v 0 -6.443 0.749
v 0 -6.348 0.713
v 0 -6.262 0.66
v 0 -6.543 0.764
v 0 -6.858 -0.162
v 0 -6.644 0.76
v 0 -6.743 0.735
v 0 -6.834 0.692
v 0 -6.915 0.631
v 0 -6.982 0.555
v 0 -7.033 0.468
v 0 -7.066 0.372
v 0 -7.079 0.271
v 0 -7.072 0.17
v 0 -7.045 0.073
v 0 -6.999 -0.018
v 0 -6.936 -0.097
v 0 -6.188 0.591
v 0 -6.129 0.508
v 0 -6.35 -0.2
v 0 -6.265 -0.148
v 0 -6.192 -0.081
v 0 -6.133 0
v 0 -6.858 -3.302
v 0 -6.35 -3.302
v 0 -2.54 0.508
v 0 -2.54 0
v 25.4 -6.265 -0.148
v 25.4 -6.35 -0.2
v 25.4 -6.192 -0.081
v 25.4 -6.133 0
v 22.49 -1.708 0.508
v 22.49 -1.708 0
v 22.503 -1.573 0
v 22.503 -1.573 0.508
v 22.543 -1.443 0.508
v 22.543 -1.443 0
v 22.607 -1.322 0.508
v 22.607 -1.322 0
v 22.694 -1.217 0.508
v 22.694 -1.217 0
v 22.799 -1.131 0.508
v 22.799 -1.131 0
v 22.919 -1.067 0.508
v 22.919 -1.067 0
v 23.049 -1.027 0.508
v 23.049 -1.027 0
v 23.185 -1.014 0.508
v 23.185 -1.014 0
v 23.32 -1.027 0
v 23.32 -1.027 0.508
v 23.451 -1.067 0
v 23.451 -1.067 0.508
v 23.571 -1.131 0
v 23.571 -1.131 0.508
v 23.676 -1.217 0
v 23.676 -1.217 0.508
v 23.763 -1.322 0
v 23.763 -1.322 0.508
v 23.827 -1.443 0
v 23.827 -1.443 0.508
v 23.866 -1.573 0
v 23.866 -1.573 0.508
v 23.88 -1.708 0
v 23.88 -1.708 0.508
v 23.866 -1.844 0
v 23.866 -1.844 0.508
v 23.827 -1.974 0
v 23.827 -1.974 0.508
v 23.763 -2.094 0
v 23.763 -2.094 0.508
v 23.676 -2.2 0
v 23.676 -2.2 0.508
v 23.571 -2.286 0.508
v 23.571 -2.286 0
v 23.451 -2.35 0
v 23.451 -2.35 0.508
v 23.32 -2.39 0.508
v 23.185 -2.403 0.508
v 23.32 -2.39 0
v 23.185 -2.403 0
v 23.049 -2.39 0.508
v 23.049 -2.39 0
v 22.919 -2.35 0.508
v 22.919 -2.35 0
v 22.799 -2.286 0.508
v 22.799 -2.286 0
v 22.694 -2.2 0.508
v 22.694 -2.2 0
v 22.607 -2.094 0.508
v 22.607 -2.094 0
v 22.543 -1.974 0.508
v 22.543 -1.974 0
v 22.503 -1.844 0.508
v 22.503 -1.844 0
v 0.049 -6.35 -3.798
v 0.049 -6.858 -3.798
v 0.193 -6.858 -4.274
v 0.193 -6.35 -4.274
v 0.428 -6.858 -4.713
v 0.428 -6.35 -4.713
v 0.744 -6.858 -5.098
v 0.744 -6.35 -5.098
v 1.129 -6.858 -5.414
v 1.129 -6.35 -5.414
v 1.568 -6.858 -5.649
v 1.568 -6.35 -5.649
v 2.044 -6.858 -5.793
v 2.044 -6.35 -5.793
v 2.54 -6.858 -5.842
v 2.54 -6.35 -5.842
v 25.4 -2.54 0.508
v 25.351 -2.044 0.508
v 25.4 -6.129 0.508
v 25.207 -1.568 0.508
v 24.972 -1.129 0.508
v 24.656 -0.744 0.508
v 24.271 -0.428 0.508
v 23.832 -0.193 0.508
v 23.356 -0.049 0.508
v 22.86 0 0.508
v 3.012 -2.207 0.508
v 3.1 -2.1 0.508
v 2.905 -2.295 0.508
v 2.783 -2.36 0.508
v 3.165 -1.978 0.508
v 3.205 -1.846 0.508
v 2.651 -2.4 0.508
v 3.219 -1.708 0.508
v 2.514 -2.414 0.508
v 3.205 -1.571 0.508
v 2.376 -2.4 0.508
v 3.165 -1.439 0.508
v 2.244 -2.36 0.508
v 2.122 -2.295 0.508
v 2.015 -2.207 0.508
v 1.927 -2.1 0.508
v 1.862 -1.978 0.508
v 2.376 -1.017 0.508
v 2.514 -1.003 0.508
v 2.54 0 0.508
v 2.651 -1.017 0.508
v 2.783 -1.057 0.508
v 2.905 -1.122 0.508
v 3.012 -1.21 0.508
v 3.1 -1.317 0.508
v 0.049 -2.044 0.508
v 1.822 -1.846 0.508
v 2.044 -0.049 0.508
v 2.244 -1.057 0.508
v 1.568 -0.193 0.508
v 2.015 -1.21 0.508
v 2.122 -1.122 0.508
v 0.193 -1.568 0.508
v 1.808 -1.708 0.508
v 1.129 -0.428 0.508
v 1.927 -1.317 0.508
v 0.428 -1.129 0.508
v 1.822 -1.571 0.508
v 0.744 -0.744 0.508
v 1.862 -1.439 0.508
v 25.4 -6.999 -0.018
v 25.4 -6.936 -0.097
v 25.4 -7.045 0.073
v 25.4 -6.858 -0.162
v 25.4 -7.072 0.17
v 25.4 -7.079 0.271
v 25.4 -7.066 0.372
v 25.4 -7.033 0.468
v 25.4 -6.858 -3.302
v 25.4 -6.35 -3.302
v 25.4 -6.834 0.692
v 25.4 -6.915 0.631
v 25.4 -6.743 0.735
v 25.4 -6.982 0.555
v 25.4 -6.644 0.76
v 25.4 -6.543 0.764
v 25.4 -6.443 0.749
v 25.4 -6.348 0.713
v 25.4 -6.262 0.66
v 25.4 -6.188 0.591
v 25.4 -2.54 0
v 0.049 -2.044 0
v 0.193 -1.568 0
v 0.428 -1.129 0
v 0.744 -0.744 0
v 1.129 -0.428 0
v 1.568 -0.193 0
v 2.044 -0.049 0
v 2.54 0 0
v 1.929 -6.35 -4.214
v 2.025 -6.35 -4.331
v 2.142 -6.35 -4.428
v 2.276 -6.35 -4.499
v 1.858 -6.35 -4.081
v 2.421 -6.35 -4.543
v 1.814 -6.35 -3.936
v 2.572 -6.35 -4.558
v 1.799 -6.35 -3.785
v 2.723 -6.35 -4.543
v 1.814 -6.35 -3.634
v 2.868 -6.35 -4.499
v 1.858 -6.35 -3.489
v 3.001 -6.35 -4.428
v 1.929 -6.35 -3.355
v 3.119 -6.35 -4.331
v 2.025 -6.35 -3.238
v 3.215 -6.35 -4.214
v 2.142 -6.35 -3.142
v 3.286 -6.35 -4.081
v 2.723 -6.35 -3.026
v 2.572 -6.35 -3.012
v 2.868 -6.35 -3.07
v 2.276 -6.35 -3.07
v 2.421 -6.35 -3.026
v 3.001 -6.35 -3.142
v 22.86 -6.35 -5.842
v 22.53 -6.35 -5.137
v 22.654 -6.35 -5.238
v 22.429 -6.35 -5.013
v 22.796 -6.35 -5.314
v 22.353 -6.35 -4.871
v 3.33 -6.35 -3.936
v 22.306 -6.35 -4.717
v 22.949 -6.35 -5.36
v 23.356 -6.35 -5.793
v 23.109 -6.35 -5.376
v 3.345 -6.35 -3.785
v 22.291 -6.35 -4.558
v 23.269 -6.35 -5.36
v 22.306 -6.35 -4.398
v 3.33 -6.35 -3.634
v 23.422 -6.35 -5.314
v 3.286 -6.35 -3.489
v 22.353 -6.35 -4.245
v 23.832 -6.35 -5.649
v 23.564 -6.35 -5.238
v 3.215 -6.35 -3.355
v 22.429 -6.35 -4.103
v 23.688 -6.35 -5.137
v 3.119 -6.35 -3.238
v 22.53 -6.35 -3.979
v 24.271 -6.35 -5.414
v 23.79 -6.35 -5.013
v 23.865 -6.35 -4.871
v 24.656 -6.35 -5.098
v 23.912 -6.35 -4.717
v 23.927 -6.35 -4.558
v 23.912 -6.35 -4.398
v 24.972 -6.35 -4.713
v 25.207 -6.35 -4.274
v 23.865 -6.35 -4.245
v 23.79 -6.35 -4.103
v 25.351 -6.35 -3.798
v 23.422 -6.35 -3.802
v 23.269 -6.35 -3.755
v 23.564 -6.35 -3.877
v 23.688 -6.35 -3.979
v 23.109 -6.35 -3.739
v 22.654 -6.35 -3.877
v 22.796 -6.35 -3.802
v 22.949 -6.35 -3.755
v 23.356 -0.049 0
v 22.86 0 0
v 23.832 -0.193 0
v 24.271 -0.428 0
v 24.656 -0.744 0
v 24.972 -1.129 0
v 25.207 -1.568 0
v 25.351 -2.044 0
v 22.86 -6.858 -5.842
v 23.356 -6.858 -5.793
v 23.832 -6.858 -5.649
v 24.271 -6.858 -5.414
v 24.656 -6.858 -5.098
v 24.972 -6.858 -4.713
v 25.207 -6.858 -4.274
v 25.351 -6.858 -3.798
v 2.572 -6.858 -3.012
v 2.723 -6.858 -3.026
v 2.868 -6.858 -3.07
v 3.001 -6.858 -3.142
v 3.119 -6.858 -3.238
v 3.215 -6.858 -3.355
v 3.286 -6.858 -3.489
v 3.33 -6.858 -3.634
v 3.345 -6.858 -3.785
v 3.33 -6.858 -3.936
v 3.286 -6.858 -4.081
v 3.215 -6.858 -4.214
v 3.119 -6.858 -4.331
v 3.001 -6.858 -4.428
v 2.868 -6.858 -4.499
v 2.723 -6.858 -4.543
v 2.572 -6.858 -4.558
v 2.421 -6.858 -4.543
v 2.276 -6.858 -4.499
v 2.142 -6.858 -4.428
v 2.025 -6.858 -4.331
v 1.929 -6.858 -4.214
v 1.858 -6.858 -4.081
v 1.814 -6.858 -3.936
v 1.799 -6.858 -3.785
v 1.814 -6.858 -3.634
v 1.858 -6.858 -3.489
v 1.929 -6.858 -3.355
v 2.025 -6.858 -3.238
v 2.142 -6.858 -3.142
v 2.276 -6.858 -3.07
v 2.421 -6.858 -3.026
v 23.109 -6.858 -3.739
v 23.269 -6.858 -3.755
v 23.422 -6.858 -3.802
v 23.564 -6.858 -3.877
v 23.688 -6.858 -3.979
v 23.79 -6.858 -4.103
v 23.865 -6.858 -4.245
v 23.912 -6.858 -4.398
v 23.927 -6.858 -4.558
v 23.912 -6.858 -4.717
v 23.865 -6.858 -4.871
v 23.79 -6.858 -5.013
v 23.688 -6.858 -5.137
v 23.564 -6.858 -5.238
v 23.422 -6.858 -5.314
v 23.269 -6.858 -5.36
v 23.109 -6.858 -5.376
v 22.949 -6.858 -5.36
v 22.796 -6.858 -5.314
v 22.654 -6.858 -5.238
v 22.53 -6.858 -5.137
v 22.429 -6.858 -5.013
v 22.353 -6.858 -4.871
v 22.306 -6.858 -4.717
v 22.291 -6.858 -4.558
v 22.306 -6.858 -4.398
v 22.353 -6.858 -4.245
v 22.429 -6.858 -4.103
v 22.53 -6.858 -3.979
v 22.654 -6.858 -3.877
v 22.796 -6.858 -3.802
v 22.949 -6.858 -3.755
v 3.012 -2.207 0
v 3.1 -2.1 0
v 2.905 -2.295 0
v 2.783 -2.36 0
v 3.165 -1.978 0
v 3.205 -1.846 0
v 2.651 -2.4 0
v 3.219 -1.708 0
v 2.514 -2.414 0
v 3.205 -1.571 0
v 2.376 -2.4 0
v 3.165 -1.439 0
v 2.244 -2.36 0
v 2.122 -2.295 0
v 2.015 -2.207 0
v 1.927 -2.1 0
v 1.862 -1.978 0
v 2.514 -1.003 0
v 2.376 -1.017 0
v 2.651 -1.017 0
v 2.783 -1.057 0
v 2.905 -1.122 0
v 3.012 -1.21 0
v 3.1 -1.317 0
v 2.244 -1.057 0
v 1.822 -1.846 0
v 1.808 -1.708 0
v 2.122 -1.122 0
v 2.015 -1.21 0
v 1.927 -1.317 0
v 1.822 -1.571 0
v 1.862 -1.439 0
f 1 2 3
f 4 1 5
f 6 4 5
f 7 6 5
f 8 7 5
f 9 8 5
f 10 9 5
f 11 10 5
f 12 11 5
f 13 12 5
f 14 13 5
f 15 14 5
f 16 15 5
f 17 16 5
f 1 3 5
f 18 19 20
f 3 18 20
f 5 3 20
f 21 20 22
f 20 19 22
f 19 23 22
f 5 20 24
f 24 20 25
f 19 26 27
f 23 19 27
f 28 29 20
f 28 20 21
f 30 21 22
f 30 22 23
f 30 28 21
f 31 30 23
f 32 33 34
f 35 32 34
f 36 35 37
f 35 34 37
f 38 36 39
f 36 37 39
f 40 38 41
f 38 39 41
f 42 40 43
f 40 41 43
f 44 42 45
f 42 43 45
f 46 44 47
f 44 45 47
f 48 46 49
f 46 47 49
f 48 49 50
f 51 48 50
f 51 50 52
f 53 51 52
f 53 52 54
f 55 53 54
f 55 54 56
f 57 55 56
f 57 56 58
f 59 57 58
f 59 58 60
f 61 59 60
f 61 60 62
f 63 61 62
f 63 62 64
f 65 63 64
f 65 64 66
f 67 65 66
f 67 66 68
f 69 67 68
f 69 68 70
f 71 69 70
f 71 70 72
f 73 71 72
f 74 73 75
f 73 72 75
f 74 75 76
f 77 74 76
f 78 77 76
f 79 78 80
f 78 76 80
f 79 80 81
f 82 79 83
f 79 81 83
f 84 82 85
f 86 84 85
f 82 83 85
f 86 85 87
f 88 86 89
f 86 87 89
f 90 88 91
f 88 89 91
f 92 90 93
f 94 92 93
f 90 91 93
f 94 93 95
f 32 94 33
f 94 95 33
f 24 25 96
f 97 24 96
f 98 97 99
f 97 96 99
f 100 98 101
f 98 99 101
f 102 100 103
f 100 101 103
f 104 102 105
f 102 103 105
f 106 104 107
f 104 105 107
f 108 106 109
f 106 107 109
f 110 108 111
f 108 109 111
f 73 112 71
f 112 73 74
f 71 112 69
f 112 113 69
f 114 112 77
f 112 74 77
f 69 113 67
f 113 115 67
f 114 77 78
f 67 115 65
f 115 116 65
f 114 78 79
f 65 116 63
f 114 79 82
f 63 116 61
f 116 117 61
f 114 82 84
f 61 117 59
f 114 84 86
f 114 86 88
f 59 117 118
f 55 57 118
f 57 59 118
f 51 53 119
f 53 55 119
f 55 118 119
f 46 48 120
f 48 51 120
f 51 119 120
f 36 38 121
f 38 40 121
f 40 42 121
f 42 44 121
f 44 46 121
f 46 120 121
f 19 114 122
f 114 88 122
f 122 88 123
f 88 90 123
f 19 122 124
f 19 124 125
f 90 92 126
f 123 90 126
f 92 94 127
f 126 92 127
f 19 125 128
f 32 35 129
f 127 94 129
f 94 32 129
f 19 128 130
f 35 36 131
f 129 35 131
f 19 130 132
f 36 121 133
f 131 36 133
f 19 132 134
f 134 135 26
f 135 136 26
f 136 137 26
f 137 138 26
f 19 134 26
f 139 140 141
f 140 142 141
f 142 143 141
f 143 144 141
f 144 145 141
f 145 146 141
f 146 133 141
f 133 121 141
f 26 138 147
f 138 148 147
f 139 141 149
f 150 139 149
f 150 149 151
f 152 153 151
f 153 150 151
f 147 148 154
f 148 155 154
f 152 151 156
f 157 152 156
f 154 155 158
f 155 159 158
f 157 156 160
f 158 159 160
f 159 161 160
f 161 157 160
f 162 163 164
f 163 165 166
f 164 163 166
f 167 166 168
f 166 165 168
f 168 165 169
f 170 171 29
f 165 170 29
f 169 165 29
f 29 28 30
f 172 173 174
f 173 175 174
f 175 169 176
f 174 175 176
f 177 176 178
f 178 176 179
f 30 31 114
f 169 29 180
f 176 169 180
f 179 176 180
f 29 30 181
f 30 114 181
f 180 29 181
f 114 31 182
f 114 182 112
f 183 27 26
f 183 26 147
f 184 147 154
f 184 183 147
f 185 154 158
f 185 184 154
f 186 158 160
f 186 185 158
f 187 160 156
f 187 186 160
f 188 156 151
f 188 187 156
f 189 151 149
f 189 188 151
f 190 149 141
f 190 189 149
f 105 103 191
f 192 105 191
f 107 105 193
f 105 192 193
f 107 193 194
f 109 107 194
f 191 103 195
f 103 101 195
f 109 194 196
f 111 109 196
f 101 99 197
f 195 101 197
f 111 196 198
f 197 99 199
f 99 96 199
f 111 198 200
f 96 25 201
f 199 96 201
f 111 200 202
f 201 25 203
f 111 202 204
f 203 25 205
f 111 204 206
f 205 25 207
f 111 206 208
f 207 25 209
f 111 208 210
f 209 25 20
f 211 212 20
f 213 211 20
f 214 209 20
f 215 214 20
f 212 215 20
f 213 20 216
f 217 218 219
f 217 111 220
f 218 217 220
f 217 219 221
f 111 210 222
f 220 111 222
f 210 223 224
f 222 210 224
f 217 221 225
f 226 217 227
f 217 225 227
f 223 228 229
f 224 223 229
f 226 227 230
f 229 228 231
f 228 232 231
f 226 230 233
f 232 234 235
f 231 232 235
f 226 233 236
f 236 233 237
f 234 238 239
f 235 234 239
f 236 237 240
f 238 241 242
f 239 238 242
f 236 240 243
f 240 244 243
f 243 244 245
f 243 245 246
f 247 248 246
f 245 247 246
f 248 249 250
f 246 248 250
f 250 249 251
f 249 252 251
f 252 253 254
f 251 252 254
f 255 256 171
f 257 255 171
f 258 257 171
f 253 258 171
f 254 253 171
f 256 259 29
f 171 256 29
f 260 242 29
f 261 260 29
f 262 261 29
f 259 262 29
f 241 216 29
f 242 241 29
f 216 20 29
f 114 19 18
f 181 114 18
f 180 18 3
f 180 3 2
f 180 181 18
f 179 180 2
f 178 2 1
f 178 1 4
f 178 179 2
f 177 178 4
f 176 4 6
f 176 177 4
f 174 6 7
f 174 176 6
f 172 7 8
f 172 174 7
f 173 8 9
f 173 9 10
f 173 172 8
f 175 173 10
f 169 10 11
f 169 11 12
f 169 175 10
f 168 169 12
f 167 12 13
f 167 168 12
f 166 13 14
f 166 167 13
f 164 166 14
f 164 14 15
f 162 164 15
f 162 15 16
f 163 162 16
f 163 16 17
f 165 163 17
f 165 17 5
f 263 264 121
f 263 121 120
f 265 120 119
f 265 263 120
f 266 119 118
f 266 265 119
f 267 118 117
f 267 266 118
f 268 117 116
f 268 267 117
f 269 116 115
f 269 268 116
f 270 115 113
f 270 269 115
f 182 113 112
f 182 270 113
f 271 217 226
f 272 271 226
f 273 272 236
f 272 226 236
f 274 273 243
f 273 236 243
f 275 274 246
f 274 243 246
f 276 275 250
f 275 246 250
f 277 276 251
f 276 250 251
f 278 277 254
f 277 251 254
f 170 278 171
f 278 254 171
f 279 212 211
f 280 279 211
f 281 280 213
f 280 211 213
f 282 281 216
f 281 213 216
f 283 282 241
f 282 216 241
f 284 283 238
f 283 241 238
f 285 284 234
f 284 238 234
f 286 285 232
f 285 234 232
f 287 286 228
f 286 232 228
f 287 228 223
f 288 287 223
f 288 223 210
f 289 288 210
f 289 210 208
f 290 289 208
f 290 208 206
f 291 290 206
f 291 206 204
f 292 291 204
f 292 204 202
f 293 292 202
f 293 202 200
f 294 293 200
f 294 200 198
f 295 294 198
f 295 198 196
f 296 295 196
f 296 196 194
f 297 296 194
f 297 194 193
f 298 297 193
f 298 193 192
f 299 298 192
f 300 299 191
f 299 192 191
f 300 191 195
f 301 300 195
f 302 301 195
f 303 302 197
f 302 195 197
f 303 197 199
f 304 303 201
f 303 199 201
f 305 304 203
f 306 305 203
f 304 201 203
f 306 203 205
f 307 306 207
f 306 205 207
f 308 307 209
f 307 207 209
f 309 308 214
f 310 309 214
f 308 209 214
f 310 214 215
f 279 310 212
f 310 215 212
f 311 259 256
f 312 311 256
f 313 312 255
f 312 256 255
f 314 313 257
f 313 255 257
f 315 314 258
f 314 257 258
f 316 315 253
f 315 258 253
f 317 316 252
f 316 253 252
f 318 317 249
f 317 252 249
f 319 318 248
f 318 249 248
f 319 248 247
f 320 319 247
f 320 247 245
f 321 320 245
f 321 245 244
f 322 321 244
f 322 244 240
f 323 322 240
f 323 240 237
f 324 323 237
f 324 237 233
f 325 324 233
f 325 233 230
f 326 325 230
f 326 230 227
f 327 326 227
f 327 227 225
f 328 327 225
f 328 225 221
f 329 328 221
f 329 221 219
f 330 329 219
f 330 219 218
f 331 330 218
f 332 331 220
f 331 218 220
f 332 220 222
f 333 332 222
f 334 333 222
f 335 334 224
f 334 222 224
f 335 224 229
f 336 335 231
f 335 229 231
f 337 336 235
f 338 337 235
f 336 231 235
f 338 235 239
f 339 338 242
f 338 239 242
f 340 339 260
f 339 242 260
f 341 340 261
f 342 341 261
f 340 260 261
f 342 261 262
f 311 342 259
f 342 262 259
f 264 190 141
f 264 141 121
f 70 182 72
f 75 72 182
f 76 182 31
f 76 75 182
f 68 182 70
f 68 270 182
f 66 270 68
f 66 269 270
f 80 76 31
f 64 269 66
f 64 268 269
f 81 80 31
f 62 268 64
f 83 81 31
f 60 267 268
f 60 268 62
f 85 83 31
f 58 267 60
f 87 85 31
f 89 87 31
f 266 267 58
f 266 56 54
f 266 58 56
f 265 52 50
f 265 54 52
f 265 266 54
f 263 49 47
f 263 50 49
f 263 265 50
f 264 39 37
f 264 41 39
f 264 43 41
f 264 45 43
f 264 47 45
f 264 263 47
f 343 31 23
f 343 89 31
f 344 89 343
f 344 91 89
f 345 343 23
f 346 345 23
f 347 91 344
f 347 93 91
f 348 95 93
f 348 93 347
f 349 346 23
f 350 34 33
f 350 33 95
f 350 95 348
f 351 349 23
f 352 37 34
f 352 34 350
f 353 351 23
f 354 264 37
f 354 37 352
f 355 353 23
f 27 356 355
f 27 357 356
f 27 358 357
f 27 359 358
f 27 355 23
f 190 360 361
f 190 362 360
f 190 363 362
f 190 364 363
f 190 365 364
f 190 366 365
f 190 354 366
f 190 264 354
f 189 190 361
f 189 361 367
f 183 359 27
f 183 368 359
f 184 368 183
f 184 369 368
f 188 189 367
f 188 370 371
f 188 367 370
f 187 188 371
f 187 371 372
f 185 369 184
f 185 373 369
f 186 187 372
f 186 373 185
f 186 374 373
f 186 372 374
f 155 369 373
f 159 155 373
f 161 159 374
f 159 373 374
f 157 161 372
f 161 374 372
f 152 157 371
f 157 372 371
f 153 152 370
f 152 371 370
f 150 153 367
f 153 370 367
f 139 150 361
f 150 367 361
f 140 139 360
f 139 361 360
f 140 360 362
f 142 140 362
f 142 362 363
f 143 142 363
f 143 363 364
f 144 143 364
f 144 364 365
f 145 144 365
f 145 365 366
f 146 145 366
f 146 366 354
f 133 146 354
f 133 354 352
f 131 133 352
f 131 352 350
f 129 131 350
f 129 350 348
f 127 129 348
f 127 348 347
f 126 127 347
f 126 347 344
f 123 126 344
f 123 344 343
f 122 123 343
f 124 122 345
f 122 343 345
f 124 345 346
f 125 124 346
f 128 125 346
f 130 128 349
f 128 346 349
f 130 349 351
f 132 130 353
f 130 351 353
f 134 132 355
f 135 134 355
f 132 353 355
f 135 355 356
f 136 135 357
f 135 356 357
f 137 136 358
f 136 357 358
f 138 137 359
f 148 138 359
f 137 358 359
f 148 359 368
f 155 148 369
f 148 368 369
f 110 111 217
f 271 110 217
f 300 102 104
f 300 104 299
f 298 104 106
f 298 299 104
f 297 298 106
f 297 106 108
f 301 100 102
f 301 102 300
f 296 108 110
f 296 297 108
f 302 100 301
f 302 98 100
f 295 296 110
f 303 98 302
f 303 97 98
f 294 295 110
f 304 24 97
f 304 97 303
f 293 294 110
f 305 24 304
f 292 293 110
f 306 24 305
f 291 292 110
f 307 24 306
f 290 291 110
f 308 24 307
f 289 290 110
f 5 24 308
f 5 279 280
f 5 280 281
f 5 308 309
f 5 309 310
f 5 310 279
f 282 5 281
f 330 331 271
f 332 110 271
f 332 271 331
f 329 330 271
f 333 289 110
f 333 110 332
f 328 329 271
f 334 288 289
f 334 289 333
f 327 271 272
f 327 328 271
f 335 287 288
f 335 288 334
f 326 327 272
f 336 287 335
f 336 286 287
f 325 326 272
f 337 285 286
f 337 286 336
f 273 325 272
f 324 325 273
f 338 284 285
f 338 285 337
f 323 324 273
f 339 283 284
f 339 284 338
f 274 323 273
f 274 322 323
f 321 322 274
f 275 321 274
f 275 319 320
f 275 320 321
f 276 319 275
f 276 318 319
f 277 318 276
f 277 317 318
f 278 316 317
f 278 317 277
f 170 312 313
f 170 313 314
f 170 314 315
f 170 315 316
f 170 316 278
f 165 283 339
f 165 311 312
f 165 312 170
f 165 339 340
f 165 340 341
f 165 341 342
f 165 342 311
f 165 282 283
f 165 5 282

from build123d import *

# Parameters (mm, degrees)
BOSS_EXTRUDE1_DEPTH = 0.508
BOSS_EXTRUDE2_DEPTH = 0.508
SKETCH3_R           = 0.508
BOSS_EXTRUDE3_DEPTH = 25.4
SKETCH4_R           = 0.694806542
SKETCH4_R_2         = 0.705318585
CUT_EXTRUDE1_DEPTH  = 25.4
SKETCH5_R           = 0.773137268
SKETCH5_R_2         = 0.818403862
CUT_EXTRUDE2_DEPTH  = 25.4


with BuildPart() as part:
    # Sketch1 → Boss-Extrude1 (new body)
    with BuildSketch(Plane.XY):
        with BuildLine():
            Line((2.54, 0), (22.86, 0))
            ThreePointArc((22.86, 0), (24.656051224, -0.743948776), (25.4, -2.54))
            Line((25.4, -2.54), (25.4, -6.35))
            Line((25.4, -6.35), (0, -6.35))
            Line((0, -6.35), (0, -2.54))
            ThreePointArc((0, -2.54), (0.743948776, -0.743948776), (2.54, 0))
        make_face()
    extrude(amount=BOSS_EXTRUDE1_DEPTH)

    # Sketch2 → Boss-Extrude2 (add)
    with BuildSketch(Plane.XZ.offset(6.35)):
        with BuildLine():
            Line((25.4, 0.508), (0, 0.508))
            Line((0, 0.508), (0, -3.302))
            ThreePointArc((0, -3.302), (0.743948776, -5.098051224), (2.54, -5.842))
            Line((2.54, -5.842), (22.86, -5.842))
            ThreePointArc((22.86, -5.842), (24.656051224, -5.098051224), (25.4, -3.302))
            Line((25.4, -3.302), (25.4, 0.508))
        make_face()
    extrude(amount=BOSS_EXTRUDE2_DEPTH)

    # Sketch3 → Boss-Extrude3 (add)
    with BuildSketch(Plane(origin=(25.4, 0, 0), x_dir=(0, 0, -1), z_dir=(1, 0, 0))):
        with Locations((-0.257183831, -6.571194295)):
            Circle(SKETCH3_R)
    extrude(amount=-BOSS_EXTRUDE3_DEPTH)

    # Sketch4 → Cut-Extrude1 (cut)
    with BuildSketch(Plane(origin=(0, 0, 0), x_dir=(-1, 0, 0), z_dir=(0, 0, -1))):
        with Locations((-23.184832038, -1.708481591)):
            Circle(SKETCH4_R)
        with Locations((-2.513571979, -1.708481591)):
            Circle(SKETCH4_R_2)
    extrude(amount=-CUT_EXTRUDE1_DEPTH, mode=Mode.SUBTRACT)

    # Sketch5 → Cut-Extrude2 (cut)
    with BuildSketch(Plane(origin=(0, -6.35, 0), x_dir=(1, 0, 0), z_dir=(0, 1, 0))):
        with Locations(Location((2.571816613, 3.784683683, 0), (0, 0, 270))):
            Circle(SKETCH5_R)
        with Locations(Location((23.109034226, 4.557820951, 0), (0, 0, 270))):
            Circle(SKETCH5_R_2)
    extrude(amount=-CUT_EXTRUDE2_DEPTH, mode=Mode.SUBTRACT)


solid = part.part
